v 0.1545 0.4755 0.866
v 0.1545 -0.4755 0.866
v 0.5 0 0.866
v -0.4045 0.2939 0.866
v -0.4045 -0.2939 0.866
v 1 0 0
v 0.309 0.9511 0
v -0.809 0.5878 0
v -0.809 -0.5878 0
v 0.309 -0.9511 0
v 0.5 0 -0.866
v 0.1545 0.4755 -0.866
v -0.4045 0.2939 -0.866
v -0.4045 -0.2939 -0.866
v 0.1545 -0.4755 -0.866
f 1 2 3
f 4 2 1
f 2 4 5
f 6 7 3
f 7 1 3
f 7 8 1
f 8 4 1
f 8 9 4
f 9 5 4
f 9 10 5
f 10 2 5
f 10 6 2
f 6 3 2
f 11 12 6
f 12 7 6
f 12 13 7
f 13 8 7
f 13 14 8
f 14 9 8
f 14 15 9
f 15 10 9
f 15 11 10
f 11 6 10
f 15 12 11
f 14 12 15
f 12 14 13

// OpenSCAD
echo("*", 3*undef);
echo("!", !undef);
echo("/", 3/undef);
echo("+", 3+undef);
echo("-", 3-undef);
echo("&&", undef&&3);
echo("&&", 3&&undef);
echo("||", undef||3);
echo("||", 3||undef);
echo("%", 3%undef);
echo("<", 3<undef);
echo("<=", 3<=undef);
echo("<=", undef<=3);
echo(">", 3>undef);
echo(">=", 3>=undef);
echo("==", 3==undef);
echo("!=", 3==undef);

echo( "abs: ",abs(undef));
echo( "sign: ",sign(undef));
echo( "cos: ",cos(undef));
echo( "sin: ",sin(undef));
echo( "tan: ",tan(undef));
echo( "acos: ",acos(undef));
echo( "asin: ",asin(undef));
echo( "atan: ",atan(undef));
echo( "atan2: ",atan2(1,undef));
echo( "atan2: ",atan2(undef,2));

echo( "min: ",min(undef,2));
echo( "max: ",max(undef,2));
echo( "max: ",max(undef,undef));
echo( "pow: ",pow(undef,2));
echo( "sqrt: ",sqrt(undef));
echo( "ln: ",ln(undef));

echo( "ceil: ",ceil(undef));
echo( "floor: ",floor(undef));
echo( "log: ",log(undef));
echo( "log: ",log(undef,2));
echo( "log: ",log(10,undef));
echo( "exp: ",exp(undef));

echo("sign", sign(undef));
echo("round", round(undef));


echo("str", str(undef));
echo("len", len(undef));


sphere();
